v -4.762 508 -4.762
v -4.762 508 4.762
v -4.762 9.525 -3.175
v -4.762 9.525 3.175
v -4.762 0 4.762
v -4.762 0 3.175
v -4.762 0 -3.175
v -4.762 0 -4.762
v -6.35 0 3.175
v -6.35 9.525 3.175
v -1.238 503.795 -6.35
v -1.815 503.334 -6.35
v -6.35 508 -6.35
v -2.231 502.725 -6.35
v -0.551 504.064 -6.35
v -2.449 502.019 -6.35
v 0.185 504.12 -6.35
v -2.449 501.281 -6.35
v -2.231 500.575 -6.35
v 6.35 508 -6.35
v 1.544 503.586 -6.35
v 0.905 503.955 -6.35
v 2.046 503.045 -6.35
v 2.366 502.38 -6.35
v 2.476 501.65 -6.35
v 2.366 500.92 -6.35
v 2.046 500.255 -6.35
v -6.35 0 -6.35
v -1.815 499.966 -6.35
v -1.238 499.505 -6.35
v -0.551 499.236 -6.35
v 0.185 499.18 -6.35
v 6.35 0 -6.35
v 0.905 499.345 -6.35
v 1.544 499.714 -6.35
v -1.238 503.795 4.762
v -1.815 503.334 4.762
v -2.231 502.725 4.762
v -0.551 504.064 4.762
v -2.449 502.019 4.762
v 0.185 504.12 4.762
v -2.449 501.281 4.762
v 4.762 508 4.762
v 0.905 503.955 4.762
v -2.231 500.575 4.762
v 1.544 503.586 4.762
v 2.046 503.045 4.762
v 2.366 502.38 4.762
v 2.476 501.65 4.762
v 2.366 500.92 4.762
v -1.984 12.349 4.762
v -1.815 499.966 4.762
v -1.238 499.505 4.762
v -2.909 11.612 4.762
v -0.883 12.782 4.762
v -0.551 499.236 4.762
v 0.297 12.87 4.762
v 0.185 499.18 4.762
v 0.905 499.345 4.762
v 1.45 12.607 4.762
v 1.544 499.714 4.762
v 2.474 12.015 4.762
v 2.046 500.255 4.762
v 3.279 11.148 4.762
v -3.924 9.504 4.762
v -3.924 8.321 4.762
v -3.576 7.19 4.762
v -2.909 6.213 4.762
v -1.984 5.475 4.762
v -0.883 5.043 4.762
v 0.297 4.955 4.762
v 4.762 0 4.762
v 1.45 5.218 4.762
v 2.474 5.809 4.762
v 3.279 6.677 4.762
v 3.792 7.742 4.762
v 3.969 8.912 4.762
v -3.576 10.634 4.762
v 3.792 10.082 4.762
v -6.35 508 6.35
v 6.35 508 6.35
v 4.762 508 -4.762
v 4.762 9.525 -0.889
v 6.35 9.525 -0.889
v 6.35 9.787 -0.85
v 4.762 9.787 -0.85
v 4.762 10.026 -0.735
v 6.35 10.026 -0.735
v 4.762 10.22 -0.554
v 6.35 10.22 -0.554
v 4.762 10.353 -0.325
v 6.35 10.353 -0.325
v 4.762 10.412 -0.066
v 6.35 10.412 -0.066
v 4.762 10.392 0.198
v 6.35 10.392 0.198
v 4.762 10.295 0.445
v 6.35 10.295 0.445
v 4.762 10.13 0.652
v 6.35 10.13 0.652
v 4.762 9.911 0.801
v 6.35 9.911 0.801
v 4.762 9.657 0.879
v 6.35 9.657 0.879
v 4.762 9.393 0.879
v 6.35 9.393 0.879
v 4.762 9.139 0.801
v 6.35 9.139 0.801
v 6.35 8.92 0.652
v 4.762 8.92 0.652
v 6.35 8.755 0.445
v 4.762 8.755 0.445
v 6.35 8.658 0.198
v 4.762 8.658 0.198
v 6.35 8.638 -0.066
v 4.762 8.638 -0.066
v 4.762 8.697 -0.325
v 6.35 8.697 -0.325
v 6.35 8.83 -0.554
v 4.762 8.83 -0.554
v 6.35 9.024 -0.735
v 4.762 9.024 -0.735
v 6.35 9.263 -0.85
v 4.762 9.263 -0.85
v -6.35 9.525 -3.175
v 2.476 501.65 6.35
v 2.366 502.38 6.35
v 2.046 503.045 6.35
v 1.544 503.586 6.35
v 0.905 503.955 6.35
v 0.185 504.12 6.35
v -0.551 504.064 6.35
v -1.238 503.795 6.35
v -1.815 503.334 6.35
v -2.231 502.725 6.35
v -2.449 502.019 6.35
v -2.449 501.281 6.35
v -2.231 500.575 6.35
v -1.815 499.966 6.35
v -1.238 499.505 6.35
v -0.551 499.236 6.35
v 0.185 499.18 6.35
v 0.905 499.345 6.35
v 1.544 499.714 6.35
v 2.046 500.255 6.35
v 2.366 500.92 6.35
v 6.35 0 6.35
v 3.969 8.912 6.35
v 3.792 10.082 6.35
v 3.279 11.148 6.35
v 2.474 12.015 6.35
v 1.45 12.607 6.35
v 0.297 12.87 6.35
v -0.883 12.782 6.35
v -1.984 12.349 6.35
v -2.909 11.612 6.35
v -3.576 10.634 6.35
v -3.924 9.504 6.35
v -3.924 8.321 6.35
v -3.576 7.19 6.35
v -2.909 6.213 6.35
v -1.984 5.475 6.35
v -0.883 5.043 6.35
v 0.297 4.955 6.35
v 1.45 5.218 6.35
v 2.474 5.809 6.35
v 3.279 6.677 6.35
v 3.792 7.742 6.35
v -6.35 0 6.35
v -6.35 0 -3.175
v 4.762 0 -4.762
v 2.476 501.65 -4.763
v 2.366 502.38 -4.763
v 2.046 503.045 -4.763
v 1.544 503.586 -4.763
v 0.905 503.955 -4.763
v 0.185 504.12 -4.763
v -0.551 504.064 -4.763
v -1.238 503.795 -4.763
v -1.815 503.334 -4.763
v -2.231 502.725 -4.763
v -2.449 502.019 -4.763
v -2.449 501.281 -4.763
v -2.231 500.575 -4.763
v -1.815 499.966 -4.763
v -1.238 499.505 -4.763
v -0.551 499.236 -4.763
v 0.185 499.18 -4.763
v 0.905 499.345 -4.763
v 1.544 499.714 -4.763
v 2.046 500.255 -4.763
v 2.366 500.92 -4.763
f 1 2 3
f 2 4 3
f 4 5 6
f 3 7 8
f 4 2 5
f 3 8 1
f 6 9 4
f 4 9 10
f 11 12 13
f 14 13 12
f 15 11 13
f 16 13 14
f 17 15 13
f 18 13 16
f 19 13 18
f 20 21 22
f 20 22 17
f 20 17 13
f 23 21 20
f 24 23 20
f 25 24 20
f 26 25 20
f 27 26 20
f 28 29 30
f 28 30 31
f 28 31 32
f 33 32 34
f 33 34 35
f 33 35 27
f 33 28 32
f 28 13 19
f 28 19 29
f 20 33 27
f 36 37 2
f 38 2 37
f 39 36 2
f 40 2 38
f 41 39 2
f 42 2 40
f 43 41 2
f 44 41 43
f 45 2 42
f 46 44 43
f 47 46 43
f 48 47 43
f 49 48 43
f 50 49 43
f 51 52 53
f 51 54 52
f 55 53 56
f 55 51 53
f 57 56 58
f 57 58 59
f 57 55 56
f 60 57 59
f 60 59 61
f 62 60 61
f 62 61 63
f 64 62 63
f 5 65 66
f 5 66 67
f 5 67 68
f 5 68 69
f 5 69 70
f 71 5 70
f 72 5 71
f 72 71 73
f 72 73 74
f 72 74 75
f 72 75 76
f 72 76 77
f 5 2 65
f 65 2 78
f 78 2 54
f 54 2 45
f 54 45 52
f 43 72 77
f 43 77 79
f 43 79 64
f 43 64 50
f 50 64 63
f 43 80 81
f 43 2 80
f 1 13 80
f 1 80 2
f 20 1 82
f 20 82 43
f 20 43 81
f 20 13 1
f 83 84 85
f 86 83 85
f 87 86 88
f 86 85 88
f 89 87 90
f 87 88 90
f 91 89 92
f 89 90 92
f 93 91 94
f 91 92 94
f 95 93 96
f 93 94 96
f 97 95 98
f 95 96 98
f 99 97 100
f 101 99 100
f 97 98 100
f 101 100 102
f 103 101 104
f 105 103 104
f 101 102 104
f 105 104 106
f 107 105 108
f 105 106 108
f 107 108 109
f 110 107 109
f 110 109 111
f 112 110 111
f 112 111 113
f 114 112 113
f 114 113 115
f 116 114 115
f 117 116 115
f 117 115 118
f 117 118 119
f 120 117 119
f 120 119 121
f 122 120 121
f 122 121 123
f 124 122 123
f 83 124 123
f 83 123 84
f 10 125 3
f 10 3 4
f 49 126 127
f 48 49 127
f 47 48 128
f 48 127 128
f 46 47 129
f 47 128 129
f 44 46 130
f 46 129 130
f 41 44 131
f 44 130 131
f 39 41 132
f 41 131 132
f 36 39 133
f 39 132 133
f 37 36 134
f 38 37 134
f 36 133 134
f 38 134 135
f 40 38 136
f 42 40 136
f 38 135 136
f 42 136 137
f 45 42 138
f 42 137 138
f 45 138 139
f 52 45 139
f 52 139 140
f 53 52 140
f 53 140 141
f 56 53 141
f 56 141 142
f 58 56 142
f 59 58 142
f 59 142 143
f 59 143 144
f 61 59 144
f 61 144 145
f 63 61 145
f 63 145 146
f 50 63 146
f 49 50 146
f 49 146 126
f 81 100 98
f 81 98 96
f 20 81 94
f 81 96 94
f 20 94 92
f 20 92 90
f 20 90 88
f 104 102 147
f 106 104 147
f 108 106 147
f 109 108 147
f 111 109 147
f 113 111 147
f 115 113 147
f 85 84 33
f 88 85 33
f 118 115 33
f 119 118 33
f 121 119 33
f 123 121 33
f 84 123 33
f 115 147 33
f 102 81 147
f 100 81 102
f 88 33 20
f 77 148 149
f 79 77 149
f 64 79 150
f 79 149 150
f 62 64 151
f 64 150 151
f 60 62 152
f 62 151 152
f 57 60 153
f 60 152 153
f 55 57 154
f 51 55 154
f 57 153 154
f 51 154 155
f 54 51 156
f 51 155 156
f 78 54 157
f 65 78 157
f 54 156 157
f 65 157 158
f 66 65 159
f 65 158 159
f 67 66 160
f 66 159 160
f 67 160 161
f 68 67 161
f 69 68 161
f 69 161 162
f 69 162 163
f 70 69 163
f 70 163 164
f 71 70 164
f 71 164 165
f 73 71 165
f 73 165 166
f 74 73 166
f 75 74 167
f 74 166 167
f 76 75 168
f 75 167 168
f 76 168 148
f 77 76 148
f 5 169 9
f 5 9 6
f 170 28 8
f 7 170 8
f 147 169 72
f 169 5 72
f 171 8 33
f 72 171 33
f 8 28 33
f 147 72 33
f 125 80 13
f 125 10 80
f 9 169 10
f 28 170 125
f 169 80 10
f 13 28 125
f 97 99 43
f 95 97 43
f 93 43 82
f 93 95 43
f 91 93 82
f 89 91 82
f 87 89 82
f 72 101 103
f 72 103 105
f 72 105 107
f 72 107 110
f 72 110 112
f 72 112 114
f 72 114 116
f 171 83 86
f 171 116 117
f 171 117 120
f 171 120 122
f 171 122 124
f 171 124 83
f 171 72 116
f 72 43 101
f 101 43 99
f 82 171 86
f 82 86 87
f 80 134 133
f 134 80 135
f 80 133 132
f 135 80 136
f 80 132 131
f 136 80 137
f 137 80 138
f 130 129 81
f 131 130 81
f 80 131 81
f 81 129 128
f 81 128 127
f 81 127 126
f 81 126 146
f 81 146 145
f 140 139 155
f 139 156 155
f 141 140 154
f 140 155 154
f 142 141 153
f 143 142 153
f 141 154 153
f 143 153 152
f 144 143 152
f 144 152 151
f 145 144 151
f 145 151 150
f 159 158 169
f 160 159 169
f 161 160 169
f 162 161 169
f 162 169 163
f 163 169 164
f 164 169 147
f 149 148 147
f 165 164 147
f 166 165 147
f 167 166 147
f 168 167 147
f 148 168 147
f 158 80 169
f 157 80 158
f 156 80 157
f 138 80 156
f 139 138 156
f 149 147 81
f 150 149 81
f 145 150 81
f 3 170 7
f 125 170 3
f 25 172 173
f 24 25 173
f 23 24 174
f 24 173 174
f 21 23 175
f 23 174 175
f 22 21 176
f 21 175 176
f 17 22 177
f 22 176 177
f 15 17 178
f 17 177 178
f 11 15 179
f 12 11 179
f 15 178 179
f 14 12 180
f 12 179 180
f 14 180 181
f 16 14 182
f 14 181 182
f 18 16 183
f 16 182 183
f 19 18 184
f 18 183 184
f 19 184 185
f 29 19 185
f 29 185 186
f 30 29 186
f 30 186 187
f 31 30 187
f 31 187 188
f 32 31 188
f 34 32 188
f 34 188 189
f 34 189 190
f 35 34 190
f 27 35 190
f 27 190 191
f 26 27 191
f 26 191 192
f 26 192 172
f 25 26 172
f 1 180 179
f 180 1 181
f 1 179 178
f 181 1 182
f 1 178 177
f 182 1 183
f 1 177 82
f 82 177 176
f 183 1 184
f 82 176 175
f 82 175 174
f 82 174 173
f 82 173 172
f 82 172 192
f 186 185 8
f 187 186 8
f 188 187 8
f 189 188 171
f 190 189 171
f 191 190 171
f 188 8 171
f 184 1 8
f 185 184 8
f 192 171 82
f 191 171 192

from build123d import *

# Parameters (mm, degrees)
SKETCH1_W               = 12.7
SKETCH1_H               = 12.7
SKETCH1_W_2             = 9.525
SKETCH1_H_2             = 9.525
EXTRUDE_THIN1_DEPTH     = 508
SKETCH2_R               = 3.96875
CUT_EXTRUDE1_DEPTH      = 1.5875
SKETCH3_R               = 2.4765
CUT_EXTRUDE2_DEPTH      = 1
CUT_EXTRUDE2_DEPTH_BACK = 13.7
CUT_EXTRUDE3_REACH      = 14.7
SKETCH4_R               = 0.889
CUT_EXTRUDE4_REACH      = 14.7
SKETCH5_W               = 6.35
SKETCH5_H               = 9.525


with BuildPart() as part:
    # Sketch1 → Extrude-Thin1 (new body)
    with BuildSketch(Plane(origin=(0, 0, 0), x_dir=(1, 0, 0), z_dir=(0, 1, 0))):
        Rectangle(SKETCH1_W, SKETCH1_H)
        Rectangle(SKETCH1_W_2, SKETCH1_H_2, mode=Mode.SUBTRACT)
    extrude(amount=EXTRUDE_THIN1_DEPTH)

    # Sketch2 → Cut-Extrude1 (cut)
    with BuildSketch(Plane.XY.offset(6.35)):
        with Locations((0, 8.9123012)):
            Circle(SKETCH2_R)
    extrude(amount=-CUT_EXTRUDE1_DEPTH, mode=Mode.SUBTRACT)

    # Sketch3 → Cut-Extrude2 (cut, two sides)
    with BuildSketch(Plane.XY.offset(6.35)) as cut_extrude2_sk:
        with Locations((0, 501.65)):
            Circle(SKETCH3_R)
    extrude(amount=CUT_EXTRUDE2_DEPTH, mode=Mode.SUBTRACT)
    extrude(cut_extrude2_sk.sketch, amount=-CUT_EXTRUDE2_DEPTH_BACK, mode=Mode.SUBTRACT)

    # Sketch4 → Cut-Extrude3 (cut, up to next)
    with BuildSketch(Plane(origin=(6.35, 0, 0), x_dir=(0, 0, -1), z_dir=(1, 0, 0)), mode=Mode.PRIVATE) as cut_extrude3_sk1:
        with Locations((0, 9.525)):
            Circle(SKETCH4_R)
    cut_extrude3_tool1 = extrude(cut_extrude3_sk1.sketch, amount=-CUT_EXTRUDE3_REACH, mode=Mode.PRIVATE) & part.part
    add(cut_extrude3_tool1.solids().sort_by_distance((6.35, 9.525, 0))[0], mode=Mode.SUBTRACT)

    # Sketch5 → Cut-Extrude4 (cut, up to next)
    with BuildSketch(Plane.ZY.offset(6.35), mode=Mode.PRIVATE) as cut_extrude4_sk1:
        with Locations((0, 4.7625)):
            Rectangle(SKETCH5_W, SKETCH5_H)
    cut_extrude4_tool1 = extrude(cut_extrude4_sk1.sketch, amount=-CUT_EXTRUDE4_REACH, mode=Mode.PRIVATE) & part.part
    add(cut_extrude4_tool1.solids().sort_by_distance((-6.35, 4.7625, 0))[0], mode=Mode.SUBTRACT)


solid = part.part
